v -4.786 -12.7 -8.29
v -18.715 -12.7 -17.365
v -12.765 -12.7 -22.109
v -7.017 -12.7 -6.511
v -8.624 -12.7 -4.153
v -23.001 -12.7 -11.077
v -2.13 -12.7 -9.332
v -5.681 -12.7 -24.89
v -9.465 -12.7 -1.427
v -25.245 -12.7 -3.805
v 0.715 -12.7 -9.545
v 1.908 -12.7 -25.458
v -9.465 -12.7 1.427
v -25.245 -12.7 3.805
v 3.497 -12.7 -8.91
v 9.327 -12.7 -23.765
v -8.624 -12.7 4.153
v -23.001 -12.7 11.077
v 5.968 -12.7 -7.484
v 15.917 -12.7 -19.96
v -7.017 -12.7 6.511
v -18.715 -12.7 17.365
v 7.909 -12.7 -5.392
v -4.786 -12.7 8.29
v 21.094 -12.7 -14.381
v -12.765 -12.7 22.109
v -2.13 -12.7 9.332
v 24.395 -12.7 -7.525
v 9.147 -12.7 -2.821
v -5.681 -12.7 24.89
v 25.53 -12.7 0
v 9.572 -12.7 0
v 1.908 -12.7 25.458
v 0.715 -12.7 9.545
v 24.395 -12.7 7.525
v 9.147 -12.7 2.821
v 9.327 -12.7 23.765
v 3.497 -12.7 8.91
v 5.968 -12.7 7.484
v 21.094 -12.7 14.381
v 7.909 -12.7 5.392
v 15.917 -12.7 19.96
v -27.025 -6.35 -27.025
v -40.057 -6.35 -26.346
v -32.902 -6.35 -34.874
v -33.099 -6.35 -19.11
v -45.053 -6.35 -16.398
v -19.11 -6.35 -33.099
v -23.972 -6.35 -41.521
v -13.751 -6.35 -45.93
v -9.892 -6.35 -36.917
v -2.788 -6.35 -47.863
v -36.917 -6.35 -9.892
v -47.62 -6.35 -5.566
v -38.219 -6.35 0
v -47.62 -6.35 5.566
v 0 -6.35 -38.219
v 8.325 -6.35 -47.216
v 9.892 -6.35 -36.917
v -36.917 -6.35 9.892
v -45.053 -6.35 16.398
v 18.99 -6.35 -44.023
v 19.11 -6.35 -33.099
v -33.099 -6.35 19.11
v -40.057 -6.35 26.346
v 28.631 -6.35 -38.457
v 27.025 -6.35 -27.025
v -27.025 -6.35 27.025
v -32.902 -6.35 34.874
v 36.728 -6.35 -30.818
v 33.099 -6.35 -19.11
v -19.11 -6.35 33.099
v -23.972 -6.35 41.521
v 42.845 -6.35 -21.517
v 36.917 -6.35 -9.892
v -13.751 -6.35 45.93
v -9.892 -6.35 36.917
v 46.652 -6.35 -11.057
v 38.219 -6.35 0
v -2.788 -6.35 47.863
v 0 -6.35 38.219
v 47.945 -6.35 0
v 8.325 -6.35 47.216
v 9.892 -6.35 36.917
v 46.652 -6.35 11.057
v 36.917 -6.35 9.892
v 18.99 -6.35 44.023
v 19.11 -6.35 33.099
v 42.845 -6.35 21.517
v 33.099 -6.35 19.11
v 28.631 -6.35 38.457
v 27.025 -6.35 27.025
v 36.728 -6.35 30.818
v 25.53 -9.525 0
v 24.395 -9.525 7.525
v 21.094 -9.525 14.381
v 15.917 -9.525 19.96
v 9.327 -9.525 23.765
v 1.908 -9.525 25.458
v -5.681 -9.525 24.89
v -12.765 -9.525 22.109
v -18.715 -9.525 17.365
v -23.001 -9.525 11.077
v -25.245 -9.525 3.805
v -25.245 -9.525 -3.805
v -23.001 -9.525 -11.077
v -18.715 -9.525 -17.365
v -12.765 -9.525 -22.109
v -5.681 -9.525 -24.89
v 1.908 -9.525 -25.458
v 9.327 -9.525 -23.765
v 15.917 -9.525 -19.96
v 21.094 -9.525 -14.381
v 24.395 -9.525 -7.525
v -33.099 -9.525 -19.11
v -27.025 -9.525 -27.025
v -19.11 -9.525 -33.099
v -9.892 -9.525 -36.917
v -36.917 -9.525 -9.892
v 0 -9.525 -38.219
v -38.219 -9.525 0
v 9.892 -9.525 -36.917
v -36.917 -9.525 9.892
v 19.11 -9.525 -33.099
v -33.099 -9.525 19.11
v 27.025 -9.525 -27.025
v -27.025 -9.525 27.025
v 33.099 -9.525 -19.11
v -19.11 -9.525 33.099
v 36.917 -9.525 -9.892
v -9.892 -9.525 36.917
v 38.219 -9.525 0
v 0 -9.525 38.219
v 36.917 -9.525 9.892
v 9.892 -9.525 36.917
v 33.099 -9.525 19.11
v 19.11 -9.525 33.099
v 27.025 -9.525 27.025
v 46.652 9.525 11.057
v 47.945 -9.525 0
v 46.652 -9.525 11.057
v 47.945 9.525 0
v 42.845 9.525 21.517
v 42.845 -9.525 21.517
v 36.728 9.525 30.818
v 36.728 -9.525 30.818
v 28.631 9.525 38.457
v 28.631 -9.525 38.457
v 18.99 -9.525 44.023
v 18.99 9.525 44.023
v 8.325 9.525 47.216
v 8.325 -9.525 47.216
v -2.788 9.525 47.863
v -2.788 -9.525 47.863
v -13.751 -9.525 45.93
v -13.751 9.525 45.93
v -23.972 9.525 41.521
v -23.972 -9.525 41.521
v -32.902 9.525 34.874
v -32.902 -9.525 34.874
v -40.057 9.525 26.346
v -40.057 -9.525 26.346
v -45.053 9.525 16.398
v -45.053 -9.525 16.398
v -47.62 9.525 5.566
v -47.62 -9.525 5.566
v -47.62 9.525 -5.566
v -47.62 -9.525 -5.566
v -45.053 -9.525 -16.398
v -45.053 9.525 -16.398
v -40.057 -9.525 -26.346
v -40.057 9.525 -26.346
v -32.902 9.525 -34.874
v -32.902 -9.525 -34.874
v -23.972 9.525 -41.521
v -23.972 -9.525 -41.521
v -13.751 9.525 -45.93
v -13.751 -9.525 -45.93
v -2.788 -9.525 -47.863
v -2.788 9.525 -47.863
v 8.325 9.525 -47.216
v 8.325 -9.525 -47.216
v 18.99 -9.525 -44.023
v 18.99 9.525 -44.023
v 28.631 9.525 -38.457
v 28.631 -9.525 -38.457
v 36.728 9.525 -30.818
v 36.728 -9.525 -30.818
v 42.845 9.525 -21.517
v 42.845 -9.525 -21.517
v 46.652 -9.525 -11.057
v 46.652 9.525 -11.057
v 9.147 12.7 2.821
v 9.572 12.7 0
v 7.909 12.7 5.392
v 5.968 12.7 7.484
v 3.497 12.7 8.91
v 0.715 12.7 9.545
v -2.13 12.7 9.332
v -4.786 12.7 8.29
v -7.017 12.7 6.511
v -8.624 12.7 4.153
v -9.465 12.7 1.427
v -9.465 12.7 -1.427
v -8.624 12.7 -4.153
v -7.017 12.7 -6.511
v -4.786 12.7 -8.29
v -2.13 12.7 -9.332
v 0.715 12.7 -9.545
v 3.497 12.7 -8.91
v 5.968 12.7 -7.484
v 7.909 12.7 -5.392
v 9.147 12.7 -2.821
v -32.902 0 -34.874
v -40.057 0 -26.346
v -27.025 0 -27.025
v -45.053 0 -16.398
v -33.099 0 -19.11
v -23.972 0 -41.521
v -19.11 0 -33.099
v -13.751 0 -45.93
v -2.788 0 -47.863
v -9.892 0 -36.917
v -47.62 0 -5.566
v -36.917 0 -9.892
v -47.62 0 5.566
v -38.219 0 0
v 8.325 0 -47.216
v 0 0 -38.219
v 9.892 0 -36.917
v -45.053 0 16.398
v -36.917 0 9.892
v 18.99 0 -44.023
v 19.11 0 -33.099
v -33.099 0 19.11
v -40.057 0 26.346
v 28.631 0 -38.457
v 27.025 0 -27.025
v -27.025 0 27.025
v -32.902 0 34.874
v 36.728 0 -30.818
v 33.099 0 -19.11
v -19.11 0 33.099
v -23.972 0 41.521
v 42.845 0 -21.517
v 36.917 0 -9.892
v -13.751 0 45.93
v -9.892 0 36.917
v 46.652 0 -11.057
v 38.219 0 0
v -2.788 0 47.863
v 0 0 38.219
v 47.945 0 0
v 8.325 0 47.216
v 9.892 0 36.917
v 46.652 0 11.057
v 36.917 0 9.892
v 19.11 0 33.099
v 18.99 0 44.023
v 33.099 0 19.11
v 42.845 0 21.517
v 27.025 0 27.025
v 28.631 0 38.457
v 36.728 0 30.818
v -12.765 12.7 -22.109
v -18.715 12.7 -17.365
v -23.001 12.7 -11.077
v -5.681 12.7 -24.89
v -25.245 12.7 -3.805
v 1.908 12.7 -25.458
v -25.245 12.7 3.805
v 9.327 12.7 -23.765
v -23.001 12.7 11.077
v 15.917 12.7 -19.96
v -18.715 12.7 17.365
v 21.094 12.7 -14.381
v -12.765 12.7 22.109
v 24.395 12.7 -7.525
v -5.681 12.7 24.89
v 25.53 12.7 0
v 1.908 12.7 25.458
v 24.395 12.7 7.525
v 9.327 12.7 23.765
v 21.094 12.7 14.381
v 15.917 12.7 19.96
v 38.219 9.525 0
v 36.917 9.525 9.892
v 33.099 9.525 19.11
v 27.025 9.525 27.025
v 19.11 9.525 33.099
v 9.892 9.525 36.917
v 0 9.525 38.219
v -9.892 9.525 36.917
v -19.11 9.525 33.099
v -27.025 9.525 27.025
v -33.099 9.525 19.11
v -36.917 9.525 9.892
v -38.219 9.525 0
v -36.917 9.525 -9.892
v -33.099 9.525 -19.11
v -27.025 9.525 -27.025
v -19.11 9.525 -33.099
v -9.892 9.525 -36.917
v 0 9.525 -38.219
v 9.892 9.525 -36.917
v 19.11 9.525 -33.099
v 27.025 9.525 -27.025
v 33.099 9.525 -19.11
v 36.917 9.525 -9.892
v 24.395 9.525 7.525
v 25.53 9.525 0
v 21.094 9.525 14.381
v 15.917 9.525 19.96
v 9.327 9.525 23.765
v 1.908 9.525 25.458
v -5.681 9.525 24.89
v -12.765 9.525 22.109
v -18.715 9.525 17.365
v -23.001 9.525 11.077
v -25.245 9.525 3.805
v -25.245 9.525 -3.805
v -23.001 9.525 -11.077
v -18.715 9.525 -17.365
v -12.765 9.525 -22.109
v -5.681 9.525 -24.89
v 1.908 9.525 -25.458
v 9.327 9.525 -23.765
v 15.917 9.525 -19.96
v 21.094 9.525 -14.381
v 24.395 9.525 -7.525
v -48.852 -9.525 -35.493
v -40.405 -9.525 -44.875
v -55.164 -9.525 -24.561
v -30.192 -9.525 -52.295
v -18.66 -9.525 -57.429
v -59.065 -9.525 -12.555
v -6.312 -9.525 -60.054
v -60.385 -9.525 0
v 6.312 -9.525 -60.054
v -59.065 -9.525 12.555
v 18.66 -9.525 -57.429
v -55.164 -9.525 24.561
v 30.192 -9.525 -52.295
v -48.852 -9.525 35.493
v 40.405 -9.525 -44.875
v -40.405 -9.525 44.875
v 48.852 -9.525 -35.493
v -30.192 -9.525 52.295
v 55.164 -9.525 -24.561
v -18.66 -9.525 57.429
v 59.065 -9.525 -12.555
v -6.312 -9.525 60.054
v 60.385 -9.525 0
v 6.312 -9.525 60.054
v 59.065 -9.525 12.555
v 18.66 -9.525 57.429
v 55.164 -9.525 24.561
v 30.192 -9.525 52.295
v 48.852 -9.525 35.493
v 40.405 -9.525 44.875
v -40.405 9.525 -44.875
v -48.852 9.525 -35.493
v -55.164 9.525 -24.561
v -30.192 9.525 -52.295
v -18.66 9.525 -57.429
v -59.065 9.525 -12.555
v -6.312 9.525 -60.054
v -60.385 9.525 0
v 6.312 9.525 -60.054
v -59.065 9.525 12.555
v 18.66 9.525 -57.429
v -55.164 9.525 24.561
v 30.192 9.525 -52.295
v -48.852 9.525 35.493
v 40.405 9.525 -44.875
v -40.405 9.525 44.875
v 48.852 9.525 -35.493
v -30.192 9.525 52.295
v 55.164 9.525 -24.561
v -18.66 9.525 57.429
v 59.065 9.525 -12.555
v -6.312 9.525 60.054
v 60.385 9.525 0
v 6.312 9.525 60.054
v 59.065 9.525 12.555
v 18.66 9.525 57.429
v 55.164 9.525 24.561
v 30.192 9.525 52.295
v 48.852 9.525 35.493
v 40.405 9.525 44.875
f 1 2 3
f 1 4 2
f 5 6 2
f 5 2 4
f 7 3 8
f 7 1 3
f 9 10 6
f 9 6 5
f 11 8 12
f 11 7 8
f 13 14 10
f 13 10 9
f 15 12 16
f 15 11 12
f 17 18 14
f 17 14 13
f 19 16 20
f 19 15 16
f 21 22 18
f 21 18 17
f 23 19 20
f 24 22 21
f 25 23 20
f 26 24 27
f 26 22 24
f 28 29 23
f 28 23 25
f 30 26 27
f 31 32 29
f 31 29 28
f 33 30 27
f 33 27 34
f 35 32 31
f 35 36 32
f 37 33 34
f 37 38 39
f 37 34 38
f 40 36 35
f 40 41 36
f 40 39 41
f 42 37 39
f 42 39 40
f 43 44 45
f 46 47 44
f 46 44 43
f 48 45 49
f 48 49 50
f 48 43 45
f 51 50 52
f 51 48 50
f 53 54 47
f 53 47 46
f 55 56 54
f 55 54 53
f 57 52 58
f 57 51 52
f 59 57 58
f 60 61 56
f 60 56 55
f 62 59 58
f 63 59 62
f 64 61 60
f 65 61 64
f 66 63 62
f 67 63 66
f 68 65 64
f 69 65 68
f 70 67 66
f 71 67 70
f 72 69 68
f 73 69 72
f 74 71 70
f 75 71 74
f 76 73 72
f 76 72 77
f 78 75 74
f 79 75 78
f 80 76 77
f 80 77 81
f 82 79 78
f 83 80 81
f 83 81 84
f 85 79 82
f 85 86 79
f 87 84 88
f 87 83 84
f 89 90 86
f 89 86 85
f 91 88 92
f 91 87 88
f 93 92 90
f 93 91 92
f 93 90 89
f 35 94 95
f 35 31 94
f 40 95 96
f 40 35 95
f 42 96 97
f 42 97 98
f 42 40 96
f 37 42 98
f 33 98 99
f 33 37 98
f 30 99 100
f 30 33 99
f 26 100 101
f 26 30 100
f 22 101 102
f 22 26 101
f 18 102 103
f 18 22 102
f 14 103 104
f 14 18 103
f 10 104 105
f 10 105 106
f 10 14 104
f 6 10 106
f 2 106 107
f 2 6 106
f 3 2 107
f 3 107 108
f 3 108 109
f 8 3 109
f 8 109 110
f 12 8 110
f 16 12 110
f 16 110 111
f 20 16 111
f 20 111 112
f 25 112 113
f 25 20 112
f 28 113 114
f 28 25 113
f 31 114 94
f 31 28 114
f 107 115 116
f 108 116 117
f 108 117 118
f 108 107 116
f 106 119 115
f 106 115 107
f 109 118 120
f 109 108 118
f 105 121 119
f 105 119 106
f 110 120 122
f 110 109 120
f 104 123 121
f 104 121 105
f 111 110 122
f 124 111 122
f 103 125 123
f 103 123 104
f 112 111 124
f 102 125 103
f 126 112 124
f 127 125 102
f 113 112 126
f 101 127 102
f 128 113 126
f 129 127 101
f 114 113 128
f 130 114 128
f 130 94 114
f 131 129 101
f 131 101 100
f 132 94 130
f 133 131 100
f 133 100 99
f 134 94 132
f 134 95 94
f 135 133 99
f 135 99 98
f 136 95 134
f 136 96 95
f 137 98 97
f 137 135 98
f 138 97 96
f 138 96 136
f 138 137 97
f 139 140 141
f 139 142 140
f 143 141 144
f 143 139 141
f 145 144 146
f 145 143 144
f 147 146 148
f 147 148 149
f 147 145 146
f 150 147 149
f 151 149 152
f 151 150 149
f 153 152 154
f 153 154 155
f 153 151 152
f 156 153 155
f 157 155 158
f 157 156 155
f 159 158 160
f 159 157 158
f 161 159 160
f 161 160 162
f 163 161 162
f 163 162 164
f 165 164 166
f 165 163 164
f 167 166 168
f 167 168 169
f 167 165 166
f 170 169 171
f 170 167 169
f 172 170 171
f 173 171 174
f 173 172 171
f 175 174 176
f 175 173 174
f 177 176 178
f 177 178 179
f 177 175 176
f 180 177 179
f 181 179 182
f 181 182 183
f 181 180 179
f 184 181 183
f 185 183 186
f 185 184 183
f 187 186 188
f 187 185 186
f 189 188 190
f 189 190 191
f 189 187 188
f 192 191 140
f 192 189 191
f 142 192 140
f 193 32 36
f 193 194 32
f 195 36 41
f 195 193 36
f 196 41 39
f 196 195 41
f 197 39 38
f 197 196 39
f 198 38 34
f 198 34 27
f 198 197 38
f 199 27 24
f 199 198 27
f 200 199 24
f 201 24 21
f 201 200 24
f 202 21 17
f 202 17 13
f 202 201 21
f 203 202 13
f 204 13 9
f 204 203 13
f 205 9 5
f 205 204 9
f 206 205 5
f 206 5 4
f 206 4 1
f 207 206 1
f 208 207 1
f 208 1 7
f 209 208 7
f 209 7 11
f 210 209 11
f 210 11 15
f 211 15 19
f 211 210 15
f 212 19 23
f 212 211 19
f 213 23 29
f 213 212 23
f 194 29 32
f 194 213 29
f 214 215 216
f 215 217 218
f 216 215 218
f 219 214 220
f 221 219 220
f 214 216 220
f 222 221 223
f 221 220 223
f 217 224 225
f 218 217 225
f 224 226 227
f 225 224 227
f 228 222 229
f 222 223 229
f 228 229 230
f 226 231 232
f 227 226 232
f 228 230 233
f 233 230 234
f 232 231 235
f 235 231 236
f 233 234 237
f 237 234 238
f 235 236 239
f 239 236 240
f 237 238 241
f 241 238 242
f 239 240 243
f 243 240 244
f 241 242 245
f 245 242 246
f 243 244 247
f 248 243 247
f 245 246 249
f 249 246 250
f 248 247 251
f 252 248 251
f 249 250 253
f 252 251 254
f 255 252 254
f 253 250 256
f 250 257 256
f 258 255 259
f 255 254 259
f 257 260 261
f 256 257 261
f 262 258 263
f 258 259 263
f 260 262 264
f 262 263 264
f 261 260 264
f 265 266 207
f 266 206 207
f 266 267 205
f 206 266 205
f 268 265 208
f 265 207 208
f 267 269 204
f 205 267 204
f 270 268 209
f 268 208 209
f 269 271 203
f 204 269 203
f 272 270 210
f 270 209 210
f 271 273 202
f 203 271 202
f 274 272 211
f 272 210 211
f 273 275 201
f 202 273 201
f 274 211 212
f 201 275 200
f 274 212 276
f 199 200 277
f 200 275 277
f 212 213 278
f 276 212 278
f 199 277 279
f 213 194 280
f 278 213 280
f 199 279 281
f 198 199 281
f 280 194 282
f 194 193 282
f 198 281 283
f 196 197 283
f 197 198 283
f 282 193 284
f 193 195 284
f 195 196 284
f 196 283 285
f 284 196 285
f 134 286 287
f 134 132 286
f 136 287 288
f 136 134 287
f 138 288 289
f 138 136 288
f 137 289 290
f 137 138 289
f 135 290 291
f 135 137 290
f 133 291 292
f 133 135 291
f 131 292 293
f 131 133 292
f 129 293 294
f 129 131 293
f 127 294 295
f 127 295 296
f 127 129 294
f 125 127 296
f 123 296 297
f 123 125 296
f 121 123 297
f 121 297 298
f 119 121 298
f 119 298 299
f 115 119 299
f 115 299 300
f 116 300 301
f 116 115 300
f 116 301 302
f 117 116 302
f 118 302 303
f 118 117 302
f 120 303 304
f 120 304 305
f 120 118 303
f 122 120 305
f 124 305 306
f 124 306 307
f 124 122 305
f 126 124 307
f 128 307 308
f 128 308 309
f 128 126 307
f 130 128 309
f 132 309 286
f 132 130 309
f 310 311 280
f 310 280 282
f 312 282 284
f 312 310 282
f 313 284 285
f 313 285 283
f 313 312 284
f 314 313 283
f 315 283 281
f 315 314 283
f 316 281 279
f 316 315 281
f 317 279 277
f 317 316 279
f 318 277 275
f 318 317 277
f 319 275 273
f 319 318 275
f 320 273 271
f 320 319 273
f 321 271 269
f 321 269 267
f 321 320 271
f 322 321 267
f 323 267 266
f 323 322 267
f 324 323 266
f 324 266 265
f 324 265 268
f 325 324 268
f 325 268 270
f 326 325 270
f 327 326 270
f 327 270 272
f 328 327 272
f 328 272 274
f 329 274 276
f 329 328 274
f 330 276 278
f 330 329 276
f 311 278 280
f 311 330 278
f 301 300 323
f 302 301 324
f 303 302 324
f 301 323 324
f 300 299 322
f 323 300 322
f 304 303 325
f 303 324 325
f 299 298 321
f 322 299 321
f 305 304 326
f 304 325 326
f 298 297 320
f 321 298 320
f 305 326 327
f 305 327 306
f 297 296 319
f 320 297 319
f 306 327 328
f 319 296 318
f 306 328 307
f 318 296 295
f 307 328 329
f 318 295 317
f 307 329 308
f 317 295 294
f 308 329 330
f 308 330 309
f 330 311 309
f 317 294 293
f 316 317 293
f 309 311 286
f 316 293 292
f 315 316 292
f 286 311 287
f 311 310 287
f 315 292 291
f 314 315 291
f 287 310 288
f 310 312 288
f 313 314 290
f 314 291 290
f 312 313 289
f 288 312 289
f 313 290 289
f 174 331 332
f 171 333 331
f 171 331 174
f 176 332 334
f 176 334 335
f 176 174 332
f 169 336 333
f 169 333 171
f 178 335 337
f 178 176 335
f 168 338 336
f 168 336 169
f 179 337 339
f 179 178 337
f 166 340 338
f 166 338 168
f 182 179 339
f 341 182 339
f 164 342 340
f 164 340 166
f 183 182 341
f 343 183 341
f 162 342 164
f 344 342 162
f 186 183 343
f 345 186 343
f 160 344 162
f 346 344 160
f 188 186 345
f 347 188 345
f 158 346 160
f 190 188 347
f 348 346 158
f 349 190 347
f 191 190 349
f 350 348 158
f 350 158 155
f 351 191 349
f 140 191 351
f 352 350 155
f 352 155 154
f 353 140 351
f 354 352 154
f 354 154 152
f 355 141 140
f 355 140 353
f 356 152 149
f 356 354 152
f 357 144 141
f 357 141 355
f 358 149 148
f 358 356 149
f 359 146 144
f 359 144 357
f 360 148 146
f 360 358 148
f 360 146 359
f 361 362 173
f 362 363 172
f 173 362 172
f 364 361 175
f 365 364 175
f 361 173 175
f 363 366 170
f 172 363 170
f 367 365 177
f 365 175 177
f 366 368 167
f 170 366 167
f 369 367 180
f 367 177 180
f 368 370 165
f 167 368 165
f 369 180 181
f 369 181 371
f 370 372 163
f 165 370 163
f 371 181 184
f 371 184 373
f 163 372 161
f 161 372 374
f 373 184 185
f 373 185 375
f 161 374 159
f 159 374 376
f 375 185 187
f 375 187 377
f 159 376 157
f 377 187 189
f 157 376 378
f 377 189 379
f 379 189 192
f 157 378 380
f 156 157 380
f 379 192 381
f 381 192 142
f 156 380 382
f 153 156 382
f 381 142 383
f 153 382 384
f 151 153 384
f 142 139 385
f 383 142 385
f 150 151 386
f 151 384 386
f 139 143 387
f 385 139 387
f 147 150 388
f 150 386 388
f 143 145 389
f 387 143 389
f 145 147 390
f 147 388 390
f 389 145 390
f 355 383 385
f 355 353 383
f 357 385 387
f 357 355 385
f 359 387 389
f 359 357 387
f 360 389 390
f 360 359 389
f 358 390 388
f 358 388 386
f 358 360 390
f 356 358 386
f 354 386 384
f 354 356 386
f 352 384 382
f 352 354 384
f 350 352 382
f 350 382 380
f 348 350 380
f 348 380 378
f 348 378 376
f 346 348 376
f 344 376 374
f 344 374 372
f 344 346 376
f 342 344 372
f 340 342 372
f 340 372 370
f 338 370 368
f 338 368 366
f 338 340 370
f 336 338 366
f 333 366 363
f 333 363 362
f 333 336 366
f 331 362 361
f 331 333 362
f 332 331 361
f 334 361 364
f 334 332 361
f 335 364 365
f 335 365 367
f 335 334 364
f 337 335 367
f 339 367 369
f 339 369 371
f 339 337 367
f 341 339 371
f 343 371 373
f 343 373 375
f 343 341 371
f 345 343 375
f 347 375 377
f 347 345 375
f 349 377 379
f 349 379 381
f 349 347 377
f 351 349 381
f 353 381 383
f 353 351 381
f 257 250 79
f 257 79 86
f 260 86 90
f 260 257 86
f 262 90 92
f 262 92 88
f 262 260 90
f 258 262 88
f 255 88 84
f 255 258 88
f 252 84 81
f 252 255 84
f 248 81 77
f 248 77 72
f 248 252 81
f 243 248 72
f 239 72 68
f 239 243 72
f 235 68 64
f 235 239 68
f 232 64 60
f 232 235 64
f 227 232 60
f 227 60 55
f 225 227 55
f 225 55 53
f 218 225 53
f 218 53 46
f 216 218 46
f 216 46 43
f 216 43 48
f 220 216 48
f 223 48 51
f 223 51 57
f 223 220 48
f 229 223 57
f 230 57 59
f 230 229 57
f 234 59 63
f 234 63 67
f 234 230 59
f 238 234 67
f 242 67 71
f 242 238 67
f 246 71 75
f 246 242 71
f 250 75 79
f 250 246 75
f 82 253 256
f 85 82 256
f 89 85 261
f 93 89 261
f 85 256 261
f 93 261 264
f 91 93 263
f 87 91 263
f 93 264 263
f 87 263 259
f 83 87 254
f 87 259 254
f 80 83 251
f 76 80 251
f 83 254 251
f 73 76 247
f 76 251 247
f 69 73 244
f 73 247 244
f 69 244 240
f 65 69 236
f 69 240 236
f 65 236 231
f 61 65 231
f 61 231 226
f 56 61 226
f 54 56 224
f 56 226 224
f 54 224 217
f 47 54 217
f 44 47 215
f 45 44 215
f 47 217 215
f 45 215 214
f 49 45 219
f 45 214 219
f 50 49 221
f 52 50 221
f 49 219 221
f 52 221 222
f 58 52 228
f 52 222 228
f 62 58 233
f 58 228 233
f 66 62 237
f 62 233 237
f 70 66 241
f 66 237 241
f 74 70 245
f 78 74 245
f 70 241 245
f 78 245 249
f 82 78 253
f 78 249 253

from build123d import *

# Parameters (mm, degrees)
F0_R     = 25.529661
F0_R_2   = 9.572123
F1_DEPTH = 12.7
F0_R_3   = 60.384645
F0_R_4   = 47.944565
F2_DEPTH = 9.525
F0_R_5   = 38.219464
F3_DEPTH = 9.525
F4_DEPTH = 6.35


with BuildPart() as f1:
    # F0 (on Front) → F1 (new body, symmetric)
    with BuildSketch(Plane.XZ):
        Circle(F0_R)
        Circle(F0_R_2, mode=Mode.SUBTRACT)
    extrude(amount=F1_DEPTH, both=True)

    # F0 (on Front) → F3 (join, symmetric)
    with BuildSketch(Plane.XZ):
        Circle(F0_R_5)
        Circle(F0_R, mode=Mode.SUBTRACT)
    extrude(amount=F3_DEPTH, both=True)


with BuildPart() as f2:
    # F0 (on Front) → F2 (new body, symmetric)
    with BuildSketch(Plane.XZ):
        Circle(F0_R_3)
        Circle(F0_R_4, mode=Mode.SUBTRACT)
    extrude(amount=F2_DEPTH, both=True)


with BuildPart() as f4:
    # F0 (on Front) → F4 (new body)
    with BuildSketch(Plane.XZ):
        Circle(F0_R_4)
        Circle(F0_R_5, mode=Mode.SUBTRACT)
    extrude(amount=F4_DEPTH)


solid = Compound([f1.part, f2.part, f4.part])
